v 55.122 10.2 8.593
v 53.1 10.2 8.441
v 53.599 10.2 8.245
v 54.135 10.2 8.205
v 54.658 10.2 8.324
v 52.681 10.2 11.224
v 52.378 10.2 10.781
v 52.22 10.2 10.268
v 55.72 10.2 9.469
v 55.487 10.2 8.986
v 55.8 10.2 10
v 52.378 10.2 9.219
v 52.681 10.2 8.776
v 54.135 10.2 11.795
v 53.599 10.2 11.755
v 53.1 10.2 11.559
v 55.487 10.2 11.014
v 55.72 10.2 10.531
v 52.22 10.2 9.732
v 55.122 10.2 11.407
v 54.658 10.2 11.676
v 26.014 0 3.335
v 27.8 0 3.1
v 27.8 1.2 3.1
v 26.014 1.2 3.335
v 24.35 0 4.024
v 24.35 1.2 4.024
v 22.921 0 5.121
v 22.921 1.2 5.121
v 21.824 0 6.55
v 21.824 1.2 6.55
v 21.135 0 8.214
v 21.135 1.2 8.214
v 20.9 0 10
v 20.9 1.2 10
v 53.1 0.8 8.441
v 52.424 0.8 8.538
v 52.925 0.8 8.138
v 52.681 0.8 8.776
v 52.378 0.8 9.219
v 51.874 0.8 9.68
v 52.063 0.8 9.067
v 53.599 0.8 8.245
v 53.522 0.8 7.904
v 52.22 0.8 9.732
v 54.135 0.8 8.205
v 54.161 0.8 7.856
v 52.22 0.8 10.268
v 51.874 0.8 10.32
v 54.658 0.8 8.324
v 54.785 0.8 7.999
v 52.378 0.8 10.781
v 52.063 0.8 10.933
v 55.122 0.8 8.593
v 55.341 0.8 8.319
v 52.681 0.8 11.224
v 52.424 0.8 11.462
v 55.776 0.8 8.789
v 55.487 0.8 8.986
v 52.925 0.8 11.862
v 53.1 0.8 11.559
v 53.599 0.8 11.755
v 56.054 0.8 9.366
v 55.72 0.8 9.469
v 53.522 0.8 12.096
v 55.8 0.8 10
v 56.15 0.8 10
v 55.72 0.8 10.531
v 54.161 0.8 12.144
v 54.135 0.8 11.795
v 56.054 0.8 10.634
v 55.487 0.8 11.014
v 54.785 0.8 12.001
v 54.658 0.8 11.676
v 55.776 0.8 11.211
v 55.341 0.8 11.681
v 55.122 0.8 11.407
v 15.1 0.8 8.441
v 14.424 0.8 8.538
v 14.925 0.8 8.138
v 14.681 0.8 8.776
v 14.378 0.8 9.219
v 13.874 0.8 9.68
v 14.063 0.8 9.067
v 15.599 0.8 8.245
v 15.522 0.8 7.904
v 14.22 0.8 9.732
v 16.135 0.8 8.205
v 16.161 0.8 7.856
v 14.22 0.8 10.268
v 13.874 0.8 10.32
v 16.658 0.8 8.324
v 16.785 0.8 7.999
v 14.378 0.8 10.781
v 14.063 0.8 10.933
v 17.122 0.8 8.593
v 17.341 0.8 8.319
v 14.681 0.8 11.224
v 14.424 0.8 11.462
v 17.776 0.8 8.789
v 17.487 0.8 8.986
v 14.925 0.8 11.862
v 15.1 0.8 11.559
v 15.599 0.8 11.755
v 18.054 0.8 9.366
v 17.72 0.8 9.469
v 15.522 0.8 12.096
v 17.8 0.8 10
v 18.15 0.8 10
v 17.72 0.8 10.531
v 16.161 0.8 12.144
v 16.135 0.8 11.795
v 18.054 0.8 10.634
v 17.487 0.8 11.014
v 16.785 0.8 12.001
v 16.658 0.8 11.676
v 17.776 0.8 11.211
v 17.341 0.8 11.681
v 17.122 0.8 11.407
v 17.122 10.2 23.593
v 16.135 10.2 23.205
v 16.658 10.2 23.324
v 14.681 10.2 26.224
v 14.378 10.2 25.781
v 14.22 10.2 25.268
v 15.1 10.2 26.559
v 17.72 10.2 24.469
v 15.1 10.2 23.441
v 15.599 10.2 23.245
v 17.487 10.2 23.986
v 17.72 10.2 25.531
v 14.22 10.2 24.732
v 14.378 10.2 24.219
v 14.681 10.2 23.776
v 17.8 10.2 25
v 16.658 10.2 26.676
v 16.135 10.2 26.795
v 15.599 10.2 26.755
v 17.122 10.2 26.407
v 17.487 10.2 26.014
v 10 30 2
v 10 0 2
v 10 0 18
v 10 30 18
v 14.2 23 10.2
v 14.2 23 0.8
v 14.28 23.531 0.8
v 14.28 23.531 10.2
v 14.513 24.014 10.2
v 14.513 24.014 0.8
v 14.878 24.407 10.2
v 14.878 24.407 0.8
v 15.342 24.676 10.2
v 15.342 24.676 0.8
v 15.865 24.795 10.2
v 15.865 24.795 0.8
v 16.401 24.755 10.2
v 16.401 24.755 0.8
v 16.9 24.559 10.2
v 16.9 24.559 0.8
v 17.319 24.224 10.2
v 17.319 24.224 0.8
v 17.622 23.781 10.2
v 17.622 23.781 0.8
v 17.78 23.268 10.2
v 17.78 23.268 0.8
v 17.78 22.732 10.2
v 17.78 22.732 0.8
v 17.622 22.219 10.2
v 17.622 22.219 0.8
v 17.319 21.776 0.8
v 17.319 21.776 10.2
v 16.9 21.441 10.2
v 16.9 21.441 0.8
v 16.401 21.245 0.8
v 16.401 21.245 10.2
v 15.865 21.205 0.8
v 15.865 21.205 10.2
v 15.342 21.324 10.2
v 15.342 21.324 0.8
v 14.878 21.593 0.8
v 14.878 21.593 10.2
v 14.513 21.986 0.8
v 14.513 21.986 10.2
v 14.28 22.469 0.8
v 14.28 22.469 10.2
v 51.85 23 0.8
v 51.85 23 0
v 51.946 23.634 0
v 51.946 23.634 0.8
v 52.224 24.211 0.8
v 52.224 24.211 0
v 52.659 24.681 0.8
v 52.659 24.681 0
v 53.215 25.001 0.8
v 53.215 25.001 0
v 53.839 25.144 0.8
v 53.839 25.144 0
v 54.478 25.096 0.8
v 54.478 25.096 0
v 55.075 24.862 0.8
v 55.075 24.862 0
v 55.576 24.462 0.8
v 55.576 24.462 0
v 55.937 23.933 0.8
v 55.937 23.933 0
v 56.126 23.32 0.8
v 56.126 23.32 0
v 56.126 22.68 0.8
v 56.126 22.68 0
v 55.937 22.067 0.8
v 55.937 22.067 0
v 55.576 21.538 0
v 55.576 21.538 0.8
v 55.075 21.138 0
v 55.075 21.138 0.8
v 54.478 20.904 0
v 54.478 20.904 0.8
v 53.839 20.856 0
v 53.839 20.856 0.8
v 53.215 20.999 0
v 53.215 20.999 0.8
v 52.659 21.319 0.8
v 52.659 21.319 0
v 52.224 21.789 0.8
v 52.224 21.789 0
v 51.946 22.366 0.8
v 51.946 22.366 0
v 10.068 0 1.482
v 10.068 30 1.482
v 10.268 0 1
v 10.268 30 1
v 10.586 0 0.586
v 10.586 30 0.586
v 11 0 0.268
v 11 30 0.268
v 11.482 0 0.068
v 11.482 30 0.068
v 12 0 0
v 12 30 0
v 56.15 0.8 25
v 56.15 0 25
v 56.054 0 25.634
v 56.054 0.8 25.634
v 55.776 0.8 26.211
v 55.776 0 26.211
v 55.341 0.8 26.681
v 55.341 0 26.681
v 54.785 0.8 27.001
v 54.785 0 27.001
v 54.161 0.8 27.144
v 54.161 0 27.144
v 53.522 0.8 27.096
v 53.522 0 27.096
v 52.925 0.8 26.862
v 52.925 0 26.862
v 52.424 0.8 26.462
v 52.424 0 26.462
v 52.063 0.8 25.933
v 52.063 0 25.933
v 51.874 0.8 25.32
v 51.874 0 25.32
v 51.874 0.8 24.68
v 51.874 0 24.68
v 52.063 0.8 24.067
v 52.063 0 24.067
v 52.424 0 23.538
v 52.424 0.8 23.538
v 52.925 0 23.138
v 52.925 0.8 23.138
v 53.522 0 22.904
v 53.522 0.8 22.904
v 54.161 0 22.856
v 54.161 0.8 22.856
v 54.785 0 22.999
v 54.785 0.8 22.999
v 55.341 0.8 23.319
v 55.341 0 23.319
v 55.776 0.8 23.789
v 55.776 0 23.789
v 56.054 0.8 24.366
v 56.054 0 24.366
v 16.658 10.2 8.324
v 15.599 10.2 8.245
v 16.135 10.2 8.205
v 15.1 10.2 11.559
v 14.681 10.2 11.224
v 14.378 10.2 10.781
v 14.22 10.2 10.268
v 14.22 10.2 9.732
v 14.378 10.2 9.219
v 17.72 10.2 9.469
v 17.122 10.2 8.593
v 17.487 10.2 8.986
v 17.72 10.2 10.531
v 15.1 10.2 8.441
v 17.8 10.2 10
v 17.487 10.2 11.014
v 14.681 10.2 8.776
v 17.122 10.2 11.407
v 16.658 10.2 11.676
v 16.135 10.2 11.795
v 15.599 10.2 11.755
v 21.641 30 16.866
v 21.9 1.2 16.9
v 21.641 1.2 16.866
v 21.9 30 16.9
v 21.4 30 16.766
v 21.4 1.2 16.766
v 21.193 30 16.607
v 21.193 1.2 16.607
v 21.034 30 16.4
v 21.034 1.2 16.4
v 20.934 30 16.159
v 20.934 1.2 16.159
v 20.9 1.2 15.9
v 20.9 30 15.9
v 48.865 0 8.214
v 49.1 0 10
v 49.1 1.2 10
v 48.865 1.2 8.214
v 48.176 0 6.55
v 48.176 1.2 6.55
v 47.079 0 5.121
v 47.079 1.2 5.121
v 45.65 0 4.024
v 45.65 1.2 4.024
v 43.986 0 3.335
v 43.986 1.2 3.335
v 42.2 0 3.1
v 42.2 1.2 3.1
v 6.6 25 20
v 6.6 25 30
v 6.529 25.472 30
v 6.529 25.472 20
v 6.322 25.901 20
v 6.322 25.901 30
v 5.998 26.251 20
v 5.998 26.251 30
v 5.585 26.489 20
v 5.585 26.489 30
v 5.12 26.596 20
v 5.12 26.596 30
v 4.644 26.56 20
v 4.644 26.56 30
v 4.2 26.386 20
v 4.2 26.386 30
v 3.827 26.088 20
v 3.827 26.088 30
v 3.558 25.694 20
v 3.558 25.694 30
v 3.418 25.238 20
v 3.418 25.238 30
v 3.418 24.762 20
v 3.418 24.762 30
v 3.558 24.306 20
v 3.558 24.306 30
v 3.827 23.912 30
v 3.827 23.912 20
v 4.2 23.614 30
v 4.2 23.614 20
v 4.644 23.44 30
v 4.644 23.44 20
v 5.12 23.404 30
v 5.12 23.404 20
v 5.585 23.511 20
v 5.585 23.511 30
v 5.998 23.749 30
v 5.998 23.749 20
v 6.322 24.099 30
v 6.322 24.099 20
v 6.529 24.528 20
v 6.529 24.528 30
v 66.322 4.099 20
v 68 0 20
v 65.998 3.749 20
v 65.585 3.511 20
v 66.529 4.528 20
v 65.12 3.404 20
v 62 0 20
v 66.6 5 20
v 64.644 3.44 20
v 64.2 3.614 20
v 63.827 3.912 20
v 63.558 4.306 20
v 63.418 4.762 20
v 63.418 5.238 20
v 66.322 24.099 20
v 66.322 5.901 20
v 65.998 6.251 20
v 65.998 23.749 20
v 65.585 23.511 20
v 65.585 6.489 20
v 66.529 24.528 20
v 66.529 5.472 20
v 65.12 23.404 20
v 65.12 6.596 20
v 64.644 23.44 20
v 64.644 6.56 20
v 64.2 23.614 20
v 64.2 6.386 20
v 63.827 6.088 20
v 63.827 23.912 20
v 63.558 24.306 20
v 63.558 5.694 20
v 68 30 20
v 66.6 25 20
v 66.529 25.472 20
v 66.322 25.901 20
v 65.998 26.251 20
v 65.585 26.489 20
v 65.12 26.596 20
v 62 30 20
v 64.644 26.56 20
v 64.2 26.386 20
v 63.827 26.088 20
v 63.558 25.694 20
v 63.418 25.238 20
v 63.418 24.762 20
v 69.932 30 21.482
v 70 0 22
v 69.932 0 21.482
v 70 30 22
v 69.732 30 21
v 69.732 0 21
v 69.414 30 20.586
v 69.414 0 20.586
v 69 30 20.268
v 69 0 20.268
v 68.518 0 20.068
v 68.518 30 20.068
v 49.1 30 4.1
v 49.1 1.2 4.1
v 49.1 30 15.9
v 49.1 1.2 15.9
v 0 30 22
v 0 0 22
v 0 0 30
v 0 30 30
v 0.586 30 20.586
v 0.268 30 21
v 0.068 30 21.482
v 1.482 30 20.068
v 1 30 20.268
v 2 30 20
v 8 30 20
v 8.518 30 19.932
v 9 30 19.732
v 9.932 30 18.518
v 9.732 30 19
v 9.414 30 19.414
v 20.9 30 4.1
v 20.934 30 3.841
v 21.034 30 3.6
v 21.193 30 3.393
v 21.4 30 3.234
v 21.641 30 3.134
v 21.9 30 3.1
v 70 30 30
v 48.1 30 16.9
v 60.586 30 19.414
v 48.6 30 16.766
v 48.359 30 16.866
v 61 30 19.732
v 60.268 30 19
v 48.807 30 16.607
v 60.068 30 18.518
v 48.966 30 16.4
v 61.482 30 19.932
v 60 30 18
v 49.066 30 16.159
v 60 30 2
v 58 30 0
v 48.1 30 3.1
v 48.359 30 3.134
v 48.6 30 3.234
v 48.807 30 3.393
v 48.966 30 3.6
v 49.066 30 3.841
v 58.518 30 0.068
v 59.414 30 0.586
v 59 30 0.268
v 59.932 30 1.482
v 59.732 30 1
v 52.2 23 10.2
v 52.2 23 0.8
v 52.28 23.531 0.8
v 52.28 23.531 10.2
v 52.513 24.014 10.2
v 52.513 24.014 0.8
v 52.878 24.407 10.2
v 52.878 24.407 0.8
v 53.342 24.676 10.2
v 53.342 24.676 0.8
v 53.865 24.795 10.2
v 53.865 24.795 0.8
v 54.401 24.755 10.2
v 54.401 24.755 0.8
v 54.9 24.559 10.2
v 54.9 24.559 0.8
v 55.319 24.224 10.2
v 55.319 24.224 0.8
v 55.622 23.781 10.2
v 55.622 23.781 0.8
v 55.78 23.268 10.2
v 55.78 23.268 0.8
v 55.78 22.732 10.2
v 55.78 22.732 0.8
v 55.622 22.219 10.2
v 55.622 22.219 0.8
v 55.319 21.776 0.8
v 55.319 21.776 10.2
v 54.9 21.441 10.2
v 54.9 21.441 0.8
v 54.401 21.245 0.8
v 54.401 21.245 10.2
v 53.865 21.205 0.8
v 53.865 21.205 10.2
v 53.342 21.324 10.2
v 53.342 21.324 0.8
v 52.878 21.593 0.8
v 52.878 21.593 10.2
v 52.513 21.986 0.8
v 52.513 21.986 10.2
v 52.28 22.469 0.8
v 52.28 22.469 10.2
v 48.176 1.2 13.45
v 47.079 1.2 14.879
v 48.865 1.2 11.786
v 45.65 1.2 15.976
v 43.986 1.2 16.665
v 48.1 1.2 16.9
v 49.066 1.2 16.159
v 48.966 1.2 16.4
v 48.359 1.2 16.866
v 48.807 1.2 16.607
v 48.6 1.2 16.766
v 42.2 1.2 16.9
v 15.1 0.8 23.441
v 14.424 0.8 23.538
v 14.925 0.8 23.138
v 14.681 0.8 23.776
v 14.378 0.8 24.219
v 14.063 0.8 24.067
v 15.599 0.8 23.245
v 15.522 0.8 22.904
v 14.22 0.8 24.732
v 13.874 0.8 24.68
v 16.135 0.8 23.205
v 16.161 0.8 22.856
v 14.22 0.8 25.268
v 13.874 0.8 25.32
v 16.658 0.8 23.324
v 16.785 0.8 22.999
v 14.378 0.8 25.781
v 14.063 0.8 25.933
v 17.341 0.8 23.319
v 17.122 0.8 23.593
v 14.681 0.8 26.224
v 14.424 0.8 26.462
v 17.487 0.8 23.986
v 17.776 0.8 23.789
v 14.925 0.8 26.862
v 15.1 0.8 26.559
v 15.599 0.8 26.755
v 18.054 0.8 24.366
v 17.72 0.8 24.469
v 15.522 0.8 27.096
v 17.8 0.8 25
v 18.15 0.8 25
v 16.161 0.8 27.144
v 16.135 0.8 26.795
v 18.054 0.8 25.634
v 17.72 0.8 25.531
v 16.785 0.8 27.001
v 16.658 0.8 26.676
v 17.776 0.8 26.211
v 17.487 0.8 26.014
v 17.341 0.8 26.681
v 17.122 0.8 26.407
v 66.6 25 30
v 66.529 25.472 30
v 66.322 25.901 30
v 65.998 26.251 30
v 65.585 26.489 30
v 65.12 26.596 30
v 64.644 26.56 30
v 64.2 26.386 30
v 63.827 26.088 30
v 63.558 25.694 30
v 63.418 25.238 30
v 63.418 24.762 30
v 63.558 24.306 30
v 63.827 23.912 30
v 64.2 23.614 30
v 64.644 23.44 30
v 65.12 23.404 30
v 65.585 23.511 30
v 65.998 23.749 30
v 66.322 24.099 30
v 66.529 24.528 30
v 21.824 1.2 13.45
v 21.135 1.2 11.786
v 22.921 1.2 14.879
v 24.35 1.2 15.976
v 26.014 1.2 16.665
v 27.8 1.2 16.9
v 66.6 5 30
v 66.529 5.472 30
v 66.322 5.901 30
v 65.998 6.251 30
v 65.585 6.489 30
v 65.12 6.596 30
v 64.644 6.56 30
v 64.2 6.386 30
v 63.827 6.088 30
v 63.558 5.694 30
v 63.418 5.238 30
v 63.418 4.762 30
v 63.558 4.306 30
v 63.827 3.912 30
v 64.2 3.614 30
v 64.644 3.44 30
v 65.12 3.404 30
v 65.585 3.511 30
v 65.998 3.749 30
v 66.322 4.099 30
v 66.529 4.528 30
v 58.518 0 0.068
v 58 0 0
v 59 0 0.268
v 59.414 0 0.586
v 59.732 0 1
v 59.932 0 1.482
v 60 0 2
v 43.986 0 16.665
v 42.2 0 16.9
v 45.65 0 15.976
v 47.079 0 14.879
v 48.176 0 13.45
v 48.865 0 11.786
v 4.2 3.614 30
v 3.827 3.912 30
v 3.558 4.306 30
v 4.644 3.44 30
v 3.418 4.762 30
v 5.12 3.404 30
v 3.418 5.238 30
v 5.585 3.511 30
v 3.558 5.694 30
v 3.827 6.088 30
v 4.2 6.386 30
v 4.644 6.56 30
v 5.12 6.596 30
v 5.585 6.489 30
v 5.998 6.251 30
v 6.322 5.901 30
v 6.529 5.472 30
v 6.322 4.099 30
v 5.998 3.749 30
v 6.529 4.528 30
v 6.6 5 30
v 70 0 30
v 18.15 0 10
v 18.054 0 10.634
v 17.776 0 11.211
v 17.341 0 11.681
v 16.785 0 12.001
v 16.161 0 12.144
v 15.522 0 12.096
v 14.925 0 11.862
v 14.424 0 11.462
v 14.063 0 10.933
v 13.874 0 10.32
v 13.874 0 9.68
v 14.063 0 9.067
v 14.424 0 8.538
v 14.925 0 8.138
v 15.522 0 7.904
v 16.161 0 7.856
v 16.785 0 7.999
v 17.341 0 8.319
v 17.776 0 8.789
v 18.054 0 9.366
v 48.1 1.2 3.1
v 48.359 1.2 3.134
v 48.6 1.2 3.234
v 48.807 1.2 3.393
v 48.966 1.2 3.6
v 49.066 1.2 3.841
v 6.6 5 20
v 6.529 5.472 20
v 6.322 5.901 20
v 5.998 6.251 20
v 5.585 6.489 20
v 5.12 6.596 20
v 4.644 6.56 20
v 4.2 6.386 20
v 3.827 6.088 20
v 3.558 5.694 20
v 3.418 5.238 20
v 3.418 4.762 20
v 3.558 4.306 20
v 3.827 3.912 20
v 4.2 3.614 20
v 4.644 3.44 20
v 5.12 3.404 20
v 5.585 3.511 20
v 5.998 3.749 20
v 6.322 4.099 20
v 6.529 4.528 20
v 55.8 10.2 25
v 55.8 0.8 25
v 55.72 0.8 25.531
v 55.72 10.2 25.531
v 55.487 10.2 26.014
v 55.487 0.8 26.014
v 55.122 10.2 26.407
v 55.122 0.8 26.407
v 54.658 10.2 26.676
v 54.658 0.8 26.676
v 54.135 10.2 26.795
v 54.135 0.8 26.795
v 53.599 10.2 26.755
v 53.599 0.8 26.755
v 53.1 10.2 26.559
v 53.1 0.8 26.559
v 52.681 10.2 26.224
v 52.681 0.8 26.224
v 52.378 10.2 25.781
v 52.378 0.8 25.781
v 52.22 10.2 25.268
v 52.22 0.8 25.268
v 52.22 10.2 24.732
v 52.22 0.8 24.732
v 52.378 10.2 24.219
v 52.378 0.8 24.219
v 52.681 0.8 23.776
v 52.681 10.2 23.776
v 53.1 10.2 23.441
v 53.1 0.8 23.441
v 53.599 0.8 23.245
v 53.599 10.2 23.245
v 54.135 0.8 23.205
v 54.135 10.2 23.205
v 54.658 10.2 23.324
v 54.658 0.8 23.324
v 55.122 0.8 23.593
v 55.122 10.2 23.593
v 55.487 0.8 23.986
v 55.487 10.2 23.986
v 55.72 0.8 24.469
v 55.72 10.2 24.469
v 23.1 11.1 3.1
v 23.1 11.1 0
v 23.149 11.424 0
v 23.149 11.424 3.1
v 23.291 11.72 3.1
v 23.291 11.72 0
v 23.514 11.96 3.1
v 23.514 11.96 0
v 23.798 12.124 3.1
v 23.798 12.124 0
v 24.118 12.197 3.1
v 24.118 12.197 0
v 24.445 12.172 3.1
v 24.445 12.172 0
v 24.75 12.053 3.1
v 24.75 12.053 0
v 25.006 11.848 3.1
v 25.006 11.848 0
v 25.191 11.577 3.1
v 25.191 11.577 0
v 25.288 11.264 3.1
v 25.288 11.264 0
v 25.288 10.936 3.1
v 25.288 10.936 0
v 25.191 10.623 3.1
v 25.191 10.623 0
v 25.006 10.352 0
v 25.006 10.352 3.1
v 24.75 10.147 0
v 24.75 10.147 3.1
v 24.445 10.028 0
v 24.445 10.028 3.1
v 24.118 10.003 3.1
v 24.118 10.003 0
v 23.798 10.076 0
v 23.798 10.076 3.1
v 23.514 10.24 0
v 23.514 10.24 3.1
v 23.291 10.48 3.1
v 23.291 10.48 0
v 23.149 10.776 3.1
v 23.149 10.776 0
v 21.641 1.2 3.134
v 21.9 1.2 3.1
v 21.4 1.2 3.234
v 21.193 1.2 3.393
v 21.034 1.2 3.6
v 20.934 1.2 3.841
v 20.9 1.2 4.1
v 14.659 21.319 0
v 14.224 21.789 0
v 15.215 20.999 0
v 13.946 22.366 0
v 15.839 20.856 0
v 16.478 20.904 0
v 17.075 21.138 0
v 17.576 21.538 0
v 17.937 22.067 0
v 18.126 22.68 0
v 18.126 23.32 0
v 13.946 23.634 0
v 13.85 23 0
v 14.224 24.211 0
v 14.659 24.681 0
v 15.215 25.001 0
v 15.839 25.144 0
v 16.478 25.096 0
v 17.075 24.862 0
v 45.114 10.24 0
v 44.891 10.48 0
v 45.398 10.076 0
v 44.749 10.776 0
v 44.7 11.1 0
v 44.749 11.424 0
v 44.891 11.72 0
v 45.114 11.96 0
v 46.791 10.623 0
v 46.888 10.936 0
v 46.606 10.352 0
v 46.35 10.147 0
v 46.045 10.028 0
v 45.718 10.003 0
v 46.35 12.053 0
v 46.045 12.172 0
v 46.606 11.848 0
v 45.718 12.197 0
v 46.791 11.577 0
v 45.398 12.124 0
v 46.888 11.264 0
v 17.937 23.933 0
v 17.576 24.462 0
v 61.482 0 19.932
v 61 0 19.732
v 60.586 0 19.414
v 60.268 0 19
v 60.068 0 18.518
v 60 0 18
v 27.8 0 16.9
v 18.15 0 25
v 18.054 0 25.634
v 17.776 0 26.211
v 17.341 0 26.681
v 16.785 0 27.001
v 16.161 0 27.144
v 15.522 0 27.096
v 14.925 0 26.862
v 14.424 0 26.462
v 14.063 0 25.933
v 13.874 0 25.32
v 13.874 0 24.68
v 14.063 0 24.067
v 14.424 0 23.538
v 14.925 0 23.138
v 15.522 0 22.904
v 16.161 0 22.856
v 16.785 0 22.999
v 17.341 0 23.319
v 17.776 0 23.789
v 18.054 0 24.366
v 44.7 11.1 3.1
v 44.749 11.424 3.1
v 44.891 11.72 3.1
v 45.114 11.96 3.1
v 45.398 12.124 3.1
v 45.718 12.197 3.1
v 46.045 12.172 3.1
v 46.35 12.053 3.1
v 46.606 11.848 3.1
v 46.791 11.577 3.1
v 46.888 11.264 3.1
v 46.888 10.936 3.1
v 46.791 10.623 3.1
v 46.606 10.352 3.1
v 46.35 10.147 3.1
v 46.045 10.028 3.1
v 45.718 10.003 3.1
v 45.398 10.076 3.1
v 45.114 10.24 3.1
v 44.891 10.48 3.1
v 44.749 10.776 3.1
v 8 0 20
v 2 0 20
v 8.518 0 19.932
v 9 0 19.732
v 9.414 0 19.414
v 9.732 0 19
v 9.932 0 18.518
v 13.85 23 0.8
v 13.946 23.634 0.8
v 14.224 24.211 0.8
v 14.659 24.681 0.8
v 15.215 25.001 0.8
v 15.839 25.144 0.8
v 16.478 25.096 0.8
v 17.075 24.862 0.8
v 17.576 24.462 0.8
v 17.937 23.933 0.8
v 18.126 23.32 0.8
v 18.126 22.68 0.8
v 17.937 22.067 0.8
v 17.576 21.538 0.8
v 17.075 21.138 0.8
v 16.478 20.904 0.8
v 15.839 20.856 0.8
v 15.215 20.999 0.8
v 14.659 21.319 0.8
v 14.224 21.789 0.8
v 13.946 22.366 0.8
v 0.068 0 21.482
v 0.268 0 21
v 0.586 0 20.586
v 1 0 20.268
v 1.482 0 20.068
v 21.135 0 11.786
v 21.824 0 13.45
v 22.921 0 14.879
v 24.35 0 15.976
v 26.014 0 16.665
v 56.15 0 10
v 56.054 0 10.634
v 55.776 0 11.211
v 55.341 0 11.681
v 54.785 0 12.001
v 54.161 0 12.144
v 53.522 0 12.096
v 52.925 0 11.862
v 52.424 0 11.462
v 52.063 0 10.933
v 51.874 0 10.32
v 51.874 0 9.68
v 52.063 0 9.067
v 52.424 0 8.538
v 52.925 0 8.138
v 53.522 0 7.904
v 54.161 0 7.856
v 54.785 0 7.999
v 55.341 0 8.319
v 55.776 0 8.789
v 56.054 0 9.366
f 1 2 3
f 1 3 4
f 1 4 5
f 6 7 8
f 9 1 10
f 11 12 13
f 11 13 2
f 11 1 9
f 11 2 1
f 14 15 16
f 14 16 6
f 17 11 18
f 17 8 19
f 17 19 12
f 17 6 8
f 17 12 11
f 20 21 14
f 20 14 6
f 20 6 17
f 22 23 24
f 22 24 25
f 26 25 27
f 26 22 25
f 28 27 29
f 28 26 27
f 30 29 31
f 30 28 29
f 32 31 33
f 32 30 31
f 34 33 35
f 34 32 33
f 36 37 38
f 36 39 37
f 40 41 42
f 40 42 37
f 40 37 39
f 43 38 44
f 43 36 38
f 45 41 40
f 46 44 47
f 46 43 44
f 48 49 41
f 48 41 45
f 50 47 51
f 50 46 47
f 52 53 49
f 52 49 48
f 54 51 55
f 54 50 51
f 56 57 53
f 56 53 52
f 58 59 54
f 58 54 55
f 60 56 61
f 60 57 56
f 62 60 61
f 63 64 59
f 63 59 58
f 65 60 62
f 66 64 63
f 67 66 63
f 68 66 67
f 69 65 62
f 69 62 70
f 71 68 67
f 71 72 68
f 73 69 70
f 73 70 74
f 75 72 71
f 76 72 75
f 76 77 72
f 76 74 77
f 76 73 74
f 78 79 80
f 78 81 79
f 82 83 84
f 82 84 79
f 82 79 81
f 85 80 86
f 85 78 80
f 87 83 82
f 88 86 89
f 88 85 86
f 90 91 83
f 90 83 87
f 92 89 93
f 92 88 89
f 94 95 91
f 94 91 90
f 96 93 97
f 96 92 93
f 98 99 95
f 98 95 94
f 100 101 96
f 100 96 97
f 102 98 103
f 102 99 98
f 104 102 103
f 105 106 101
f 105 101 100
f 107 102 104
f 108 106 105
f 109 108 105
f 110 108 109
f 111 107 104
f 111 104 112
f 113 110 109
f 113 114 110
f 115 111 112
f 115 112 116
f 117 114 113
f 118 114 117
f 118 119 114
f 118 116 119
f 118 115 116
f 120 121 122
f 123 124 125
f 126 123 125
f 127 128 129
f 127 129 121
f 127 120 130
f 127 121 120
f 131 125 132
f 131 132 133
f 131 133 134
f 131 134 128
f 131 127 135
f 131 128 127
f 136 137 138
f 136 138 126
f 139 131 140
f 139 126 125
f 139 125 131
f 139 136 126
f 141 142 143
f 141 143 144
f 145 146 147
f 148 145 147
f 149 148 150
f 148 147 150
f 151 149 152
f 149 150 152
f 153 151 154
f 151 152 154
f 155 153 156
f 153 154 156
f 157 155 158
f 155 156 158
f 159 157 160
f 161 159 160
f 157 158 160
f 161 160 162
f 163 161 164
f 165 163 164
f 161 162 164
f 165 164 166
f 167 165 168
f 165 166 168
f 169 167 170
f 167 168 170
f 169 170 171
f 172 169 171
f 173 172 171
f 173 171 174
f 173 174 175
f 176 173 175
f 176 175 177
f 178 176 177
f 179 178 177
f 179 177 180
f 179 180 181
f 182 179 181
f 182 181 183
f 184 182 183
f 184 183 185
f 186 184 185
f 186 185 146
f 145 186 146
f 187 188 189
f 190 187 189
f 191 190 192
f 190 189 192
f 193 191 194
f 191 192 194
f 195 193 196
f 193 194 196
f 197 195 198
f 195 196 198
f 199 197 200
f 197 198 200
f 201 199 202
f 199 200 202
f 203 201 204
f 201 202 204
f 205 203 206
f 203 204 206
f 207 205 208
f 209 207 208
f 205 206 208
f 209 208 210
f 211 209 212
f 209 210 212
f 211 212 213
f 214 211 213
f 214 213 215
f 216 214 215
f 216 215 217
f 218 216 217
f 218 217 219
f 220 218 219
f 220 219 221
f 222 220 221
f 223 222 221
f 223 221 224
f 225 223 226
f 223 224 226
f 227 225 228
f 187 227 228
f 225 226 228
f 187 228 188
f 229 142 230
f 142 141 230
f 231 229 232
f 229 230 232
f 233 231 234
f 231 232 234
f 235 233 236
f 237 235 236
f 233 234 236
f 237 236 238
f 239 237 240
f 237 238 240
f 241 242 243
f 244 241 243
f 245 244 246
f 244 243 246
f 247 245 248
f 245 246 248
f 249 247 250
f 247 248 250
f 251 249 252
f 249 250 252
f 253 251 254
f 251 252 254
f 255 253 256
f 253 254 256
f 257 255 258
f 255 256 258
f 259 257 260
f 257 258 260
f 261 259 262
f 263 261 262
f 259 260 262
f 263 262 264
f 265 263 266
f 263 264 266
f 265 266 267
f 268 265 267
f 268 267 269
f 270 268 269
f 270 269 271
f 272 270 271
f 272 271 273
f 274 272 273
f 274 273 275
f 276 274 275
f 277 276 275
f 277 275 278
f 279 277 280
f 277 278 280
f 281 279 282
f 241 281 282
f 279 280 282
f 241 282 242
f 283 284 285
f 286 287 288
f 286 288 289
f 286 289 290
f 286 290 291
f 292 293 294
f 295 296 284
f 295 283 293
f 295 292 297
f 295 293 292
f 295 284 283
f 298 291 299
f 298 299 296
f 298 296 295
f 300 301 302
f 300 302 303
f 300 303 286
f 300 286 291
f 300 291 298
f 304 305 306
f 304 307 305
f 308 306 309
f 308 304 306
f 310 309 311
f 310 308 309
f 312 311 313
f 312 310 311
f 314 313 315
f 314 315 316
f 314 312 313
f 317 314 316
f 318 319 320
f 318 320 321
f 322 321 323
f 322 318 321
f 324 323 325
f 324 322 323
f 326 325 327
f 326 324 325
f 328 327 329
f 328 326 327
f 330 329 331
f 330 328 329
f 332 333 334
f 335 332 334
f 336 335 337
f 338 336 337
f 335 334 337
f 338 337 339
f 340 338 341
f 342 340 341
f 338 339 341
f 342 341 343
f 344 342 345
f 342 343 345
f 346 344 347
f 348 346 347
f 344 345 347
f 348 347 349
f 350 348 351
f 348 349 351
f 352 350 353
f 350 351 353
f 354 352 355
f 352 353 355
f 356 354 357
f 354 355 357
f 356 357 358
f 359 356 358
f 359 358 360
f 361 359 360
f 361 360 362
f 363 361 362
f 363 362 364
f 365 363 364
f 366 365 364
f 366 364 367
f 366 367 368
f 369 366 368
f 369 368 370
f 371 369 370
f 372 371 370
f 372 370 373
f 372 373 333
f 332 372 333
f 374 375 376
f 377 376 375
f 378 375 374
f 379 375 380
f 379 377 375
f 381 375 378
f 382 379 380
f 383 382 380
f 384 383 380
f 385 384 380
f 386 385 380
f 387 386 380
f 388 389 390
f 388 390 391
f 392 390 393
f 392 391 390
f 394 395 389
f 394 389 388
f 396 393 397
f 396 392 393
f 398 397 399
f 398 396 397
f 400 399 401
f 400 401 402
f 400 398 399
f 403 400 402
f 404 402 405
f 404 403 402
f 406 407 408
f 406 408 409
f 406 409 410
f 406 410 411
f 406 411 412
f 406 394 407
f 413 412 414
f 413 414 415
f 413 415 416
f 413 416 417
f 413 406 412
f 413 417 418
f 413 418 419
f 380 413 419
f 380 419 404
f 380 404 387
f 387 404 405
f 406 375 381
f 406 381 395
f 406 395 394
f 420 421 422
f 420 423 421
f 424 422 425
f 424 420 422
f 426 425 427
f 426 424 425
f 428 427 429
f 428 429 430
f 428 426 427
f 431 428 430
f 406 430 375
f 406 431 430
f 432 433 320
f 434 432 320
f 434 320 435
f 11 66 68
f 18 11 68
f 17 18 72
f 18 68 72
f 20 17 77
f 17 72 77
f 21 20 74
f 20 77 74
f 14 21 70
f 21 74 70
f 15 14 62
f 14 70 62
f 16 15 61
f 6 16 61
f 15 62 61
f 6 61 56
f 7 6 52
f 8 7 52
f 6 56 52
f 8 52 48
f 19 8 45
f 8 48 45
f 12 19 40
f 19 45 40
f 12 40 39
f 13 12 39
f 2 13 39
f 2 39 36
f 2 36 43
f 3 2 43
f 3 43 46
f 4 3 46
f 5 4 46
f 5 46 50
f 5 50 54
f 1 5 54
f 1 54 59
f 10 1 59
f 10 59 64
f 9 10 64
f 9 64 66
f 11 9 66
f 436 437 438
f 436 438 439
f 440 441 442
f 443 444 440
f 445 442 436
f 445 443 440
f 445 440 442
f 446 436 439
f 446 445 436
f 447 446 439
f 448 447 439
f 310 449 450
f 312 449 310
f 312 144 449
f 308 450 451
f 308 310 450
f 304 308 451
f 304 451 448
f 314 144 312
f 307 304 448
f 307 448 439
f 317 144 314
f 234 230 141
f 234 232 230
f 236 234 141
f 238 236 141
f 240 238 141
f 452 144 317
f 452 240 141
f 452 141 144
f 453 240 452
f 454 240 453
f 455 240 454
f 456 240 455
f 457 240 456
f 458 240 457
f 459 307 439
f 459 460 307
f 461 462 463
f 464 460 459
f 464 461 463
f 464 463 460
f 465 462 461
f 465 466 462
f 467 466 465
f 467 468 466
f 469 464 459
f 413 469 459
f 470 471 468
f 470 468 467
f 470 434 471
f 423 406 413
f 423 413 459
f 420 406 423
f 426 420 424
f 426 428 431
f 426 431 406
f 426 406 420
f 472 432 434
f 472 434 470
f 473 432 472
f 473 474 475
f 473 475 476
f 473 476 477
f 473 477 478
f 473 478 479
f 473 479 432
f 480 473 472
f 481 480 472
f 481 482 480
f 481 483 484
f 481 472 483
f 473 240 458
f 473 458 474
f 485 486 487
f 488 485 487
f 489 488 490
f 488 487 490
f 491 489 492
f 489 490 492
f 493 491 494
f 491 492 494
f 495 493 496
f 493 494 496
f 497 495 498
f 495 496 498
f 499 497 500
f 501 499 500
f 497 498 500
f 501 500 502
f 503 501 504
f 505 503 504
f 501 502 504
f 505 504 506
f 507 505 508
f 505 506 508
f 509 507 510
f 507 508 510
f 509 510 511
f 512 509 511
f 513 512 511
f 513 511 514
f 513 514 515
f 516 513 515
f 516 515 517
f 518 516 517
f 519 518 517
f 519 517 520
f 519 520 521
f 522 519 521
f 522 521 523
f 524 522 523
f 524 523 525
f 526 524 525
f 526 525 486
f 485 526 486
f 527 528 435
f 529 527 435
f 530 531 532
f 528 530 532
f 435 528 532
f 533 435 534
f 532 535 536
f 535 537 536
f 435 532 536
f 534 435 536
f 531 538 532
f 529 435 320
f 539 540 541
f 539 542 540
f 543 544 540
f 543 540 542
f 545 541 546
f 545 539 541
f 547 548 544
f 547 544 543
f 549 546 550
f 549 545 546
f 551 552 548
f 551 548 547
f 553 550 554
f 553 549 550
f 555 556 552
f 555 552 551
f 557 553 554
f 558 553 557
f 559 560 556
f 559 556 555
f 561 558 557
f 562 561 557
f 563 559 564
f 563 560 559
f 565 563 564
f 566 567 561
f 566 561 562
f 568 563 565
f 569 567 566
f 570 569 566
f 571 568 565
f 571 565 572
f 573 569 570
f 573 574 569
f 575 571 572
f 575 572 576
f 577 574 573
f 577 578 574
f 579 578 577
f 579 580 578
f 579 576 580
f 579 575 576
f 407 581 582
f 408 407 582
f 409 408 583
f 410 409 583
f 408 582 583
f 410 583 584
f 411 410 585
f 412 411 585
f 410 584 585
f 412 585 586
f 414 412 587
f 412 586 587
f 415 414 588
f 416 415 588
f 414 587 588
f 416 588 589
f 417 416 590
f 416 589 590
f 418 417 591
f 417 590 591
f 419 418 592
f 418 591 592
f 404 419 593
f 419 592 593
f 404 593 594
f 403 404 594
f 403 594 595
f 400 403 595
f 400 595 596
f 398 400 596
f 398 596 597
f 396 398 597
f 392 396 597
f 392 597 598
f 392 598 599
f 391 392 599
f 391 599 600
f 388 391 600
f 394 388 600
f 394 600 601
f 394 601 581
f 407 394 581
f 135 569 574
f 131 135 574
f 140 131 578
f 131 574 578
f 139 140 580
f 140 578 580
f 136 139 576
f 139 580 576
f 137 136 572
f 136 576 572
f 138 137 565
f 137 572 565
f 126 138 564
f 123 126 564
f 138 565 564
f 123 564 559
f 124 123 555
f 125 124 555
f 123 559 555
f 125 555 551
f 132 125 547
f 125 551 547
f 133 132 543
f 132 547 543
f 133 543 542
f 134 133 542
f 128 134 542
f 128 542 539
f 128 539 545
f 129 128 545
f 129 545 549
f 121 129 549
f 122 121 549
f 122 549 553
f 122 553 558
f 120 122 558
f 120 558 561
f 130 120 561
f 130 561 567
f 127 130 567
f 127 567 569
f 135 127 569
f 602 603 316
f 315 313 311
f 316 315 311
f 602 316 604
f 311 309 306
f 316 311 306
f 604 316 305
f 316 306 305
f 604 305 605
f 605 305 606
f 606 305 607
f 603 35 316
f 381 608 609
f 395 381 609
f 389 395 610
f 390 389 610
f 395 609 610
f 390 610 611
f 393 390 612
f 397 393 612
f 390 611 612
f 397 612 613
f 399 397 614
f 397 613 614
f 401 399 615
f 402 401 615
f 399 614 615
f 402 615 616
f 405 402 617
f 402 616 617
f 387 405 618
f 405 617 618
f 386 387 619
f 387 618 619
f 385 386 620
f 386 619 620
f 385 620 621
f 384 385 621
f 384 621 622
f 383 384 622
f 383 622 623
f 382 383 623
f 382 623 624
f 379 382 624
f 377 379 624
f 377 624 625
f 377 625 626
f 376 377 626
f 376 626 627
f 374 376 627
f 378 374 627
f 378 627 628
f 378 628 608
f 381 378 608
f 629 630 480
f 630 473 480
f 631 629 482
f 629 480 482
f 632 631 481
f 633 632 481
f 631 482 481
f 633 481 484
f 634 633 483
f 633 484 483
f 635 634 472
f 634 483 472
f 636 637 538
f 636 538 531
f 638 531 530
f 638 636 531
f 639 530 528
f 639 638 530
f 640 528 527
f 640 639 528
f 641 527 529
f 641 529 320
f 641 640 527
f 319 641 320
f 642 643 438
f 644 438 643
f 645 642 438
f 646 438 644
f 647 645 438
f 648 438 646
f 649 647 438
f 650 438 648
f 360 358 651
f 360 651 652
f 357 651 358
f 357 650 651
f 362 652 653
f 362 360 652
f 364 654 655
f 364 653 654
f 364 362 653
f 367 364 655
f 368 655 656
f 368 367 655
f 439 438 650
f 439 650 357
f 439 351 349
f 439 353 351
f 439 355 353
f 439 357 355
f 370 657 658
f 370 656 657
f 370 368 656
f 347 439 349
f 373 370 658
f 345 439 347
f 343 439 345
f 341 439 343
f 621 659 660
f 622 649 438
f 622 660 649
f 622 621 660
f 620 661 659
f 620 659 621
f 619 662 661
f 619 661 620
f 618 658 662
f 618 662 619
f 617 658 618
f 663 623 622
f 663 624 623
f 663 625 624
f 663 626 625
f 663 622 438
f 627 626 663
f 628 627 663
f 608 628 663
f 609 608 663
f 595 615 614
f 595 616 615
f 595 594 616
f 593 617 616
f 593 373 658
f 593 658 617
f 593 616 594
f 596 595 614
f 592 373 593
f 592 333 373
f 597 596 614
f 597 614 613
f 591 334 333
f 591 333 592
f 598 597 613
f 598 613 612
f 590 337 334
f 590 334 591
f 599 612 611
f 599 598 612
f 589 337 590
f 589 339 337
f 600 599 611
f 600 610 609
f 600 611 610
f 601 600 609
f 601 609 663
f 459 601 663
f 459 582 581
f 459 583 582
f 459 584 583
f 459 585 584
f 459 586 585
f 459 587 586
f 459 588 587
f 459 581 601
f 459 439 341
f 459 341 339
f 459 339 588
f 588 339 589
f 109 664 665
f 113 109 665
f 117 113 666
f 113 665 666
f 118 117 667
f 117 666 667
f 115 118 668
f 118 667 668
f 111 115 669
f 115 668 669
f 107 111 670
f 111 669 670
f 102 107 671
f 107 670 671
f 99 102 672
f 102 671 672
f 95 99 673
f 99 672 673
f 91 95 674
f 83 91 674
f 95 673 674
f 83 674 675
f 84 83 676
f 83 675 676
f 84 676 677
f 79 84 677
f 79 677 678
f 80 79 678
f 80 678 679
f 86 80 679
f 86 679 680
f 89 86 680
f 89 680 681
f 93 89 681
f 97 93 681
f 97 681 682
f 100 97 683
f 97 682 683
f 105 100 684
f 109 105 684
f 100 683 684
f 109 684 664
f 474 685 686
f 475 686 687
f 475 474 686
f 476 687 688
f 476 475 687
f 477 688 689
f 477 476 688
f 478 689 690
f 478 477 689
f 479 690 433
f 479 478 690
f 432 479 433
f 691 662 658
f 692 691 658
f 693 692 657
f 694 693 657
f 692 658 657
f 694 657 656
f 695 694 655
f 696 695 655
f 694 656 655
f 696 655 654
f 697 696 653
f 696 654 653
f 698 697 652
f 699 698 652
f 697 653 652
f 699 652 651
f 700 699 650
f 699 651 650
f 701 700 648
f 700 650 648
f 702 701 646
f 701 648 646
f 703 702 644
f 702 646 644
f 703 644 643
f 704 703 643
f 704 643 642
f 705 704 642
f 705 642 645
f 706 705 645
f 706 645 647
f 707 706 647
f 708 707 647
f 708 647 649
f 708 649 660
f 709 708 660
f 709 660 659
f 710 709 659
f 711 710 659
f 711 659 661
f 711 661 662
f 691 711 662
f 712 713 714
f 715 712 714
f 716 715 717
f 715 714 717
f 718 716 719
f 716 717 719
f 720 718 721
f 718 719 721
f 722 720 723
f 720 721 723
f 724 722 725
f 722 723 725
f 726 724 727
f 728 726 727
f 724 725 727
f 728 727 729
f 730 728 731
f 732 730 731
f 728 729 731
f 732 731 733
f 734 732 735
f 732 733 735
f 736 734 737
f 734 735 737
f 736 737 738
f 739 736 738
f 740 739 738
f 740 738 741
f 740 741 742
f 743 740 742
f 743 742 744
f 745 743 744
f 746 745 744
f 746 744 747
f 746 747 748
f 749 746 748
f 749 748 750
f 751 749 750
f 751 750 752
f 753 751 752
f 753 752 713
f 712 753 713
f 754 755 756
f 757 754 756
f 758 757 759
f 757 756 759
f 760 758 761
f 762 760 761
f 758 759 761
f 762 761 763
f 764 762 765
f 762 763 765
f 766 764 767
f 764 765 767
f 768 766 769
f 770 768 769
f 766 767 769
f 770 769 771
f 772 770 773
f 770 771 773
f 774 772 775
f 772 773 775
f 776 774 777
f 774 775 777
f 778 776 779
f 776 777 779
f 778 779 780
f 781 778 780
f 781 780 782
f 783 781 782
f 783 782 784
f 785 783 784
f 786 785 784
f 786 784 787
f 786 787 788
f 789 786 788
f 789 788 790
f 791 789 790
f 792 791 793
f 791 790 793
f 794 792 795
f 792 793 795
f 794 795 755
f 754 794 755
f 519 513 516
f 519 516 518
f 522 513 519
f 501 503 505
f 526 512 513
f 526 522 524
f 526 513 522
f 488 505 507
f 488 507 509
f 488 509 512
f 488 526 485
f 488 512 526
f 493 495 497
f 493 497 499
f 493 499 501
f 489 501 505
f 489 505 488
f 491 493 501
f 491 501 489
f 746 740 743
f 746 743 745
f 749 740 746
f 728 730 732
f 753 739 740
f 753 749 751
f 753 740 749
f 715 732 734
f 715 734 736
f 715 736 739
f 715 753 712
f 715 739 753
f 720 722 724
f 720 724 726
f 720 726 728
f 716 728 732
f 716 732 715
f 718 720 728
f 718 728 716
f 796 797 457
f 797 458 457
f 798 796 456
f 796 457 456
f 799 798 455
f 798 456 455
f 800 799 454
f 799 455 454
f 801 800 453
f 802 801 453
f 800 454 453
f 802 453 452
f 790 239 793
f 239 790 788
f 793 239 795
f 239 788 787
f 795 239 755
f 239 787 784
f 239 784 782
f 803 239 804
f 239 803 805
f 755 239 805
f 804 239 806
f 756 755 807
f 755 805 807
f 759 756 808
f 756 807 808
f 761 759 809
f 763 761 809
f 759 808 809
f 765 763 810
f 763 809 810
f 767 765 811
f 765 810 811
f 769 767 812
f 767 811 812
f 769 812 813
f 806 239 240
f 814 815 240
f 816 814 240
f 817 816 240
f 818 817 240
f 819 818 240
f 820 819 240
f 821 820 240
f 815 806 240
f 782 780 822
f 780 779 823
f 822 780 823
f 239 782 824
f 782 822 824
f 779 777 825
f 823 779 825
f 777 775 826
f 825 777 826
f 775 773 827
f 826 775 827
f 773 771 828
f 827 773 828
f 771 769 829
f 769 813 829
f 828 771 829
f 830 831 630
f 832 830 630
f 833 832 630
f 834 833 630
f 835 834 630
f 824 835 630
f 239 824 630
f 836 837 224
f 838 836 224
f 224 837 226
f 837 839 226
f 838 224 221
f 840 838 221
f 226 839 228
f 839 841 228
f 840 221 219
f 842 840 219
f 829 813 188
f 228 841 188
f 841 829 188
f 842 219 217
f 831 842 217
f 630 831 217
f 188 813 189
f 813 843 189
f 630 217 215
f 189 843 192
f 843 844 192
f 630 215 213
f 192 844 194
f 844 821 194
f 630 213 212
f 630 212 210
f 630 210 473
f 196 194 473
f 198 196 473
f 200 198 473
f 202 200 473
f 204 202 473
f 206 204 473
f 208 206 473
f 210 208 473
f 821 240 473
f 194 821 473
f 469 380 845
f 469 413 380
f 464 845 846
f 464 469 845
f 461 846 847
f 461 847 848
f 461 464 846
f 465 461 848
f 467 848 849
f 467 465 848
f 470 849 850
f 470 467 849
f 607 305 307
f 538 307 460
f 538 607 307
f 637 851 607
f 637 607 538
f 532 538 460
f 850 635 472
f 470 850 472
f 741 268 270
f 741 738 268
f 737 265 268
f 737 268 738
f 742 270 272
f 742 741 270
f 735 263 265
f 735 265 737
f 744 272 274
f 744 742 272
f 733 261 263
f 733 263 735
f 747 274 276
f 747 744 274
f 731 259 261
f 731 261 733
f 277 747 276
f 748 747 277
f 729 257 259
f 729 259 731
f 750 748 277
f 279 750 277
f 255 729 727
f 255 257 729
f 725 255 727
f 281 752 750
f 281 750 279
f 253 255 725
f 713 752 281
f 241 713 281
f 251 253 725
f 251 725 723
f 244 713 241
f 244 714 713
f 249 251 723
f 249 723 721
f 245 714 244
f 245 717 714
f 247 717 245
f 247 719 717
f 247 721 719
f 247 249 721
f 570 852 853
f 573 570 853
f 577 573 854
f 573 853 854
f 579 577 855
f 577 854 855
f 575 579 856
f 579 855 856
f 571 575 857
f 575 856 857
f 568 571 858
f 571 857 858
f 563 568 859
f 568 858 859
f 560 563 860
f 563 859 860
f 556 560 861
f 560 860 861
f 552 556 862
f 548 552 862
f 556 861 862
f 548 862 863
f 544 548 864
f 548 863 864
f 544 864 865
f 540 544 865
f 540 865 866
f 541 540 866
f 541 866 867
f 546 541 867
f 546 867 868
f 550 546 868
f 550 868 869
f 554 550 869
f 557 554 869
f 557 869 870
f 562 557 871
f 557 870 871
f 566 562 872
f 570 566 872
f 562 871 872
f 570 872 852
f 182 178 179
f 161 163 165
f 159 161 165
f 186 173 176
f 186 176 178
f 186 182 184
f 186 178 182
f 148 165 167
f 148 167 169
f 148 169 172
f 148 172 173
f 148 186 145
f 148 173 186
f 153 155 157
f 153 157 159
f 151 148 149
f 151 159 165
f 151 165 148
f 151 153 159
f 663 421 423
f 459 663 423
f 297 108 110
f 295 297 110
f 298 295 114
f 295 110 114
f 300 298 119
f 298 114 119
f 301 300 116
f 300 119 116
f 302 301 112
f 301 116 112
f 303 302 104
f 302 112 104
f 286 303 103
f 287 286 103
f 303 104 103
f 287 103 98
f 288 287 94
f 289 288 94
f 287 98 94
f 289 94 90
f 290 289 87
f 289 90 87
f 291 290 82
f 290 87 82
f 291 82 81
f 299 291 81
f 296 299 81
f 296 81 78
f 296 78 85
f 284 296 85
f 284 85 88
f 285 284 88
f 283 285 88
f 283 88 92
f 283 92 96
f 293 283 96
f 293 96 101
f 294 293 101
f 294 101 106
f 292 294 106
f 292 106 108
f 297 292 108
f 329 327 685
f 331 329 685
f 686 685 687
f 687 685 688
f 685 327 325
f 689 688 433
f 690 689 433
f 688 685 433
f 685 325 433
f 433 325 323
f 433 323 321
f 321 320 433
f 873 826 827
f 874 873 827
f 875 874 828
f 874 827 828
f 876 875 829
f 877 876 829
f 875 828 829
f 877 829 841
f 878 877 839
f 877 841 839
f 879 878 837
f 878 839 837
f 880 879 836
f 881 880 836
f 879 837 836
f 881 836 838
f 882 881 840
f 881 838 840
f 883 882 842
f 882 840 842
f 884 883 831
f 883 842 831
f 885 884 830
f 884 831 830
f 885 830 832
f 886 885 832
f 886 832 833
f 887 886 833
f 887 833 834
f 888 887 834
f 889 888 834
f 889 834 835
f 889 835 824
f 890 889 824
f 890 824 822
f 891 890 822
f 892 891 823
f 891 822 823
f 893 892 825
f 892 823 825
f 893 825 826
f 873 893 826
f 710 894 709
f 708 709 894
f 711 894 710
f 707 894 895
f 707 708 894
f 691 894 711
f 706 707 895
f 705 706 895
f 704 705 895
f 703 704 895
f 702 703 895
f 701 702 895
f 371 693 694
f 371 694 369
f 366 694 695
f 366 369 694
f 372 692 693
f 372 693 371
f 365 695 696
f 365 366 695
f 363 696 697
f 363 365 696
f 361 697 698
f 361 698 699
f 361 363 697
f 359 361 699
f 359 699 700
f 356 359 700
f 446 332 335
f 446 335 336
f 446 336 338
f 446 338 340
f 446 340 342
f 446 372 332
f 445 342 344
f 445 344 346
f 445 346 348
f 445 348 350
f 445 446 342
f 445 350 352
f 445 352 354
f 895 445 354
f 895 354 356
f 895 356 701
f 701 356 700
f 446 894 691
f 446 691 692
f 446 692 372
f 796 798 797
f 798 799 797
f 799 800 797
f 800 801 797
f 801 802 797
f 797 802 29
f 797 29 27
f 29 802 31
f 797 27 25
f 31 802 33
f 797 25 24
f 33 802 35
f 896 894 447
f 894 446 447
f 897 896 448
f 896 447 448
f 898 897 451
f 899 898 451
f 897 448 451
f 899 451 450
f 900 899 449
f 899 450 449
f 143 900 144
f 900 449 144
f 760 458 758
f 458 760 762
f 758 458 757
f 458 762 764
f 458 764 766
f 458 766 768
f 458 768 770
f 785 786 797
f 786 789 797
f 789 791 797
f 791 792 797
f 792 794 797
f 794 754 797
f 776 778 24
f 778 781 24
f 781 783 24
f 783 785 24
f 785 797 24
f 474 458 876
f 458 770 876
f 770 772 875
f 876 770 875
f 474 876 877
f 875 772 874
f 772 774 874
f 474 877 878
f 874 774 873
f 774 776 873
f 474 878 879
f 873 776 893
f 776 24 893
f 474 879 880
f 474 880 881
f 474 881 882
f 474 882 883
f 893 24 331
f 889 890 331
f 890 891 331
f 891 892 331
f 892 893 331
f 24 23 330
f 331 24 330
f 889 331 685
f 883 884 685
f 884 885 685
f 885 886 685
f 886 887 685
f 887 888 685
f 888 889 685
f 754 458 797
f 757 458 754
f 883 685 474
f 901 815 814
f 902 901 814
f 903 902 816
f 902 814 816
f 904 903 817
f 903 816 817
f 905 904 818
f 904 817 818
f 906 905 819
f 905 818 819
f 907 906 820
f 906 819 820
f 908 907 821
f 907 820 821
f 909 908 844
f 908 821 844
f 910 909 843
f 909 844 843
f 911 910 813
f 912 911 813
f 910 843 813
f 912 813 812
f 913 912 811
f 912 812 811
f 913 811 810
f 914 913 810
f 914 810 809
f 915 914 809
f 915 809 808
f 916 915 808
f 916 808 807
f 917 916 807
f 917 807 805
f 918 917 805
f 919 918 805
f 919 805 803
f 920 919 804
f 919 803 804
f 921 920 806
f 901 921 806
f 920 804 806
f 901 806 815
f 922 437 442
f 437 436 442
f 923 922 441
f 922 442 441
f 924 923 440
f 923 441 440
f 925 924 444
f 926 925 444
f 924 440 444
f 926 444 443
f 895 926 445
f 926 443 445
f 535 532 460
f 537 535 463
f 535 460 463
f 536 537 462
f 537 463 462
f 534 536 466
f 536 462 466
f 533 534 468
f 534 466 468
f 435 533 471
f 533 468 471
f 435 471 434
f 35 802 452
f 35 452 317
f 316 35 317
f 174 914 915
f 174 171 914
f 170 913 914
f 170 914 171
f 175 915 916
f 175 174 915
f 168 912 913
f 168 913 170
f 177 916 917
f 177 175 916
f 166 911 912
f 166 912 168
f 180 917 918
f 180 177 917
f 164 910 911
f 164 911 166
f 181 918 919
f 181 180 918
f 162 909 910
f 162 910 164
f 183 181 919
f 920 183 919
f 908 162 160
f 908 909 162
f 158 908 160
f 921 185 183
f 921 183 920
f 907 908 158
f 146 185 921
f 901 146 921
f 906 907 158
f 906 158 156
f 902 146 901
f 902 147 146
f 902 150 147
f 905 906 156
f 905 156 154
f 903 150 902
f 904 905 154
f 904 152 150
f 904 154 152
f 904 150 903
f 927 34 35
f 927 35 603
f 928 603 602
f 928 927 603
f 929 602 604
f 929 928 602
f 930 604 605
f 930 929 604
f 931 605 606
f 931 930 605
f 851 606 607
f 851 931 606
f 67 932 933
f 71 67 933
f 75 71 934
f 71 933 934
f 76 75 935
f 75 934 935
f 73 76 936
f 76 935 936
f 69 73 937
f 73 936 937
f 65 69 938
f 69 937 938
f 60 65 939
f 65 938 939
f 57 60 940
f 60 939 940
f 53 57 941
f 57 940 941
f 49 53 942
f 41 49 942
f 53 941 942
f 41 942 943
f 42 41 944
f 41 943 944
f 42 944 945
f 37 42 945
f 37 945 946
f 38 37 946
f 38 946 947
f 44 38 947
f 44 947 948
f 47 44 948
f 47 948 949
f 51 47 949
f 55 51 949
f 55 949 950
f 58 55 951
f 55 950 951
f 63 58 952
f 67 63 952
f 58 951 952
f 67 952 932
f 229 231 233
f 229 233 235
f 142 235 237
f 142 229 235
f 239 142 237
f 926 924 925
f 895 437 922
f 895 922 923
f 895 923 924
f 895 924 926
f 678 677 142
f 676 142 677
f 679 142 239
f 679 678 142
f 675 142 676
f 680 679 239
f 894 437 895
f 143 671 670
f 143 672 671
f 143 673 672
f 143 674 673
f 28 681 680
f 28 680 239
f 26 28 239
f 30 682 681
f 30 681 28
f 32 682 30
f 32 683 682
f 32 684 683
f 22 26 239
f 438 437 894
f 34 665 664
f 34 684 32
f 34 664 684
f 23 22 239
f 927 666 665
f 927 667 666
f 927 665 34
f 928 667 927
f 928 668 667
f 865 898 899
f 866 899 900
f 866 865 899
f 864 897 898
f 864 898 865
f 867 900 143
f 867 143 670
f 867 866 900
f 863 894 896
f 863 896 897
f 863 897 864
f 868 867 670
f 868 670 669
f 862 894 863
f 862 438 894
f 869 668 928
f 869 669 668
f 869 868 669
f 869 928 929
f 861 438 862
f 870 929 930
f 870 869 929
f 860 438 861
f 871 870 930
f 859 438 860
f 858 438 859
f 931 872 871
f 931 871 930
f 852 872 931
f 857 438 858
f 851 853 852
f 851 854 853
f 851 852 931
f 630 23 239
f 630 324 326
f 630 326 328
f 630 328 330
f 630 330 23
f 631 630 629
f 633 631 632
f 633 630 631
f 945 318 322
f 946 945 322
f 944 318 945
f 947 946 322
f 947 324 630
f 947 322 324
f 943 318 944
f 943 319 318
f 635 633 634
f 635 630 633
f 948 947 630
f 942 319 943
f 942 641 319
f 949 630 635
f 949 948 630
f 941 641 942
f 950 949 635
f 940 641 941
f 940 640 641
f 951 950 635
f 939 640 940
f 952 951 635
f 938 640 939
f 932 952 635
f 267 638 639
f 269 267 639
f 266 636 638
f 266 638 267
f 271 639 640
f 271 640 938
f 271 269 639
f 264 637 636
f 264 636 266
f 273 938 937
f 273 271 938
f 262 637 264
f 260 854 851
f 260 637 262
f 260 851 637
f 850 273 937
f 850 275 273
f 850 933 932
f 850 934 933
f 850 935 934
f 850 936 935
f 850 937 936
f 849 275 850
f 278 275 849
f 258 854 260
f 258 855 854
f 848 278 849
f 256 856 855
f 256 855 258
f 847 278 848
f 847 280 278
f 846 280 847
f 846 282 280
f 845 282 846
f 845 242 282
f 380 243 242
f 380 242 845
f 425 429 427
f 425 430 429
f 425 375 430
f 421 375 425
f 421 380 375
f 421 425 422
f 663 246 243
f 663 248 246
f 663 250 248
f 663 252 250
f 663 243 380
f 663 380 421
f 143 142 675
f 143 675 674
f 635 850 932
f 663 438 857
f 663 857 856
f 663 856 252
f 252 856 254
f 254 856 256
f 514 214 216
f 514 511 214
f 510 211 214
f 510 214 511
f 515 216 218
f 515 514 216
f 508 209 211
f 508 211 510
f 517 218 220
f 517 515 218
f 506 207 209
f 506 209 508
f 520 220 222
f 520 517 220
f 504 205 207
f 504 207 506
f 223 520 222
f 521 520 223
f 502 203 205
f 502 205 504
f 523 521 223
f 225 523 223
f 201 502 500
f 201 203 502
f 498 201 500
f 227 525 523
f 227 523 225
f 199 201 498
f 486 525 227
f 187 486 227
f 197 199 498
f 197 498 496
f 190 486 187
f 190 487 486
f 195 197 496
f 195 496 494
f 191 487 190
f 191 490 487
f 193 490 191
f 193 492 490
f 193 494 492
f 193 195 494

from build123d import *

# Parameters (mm, degrees)
SKETCH_1_W          = 70
SKETCH_1_H          = 30
EXTRUDE_1_DEPTH     = 30
SKETCH_2_R          = 1.6
CUT_EXTRUDE_1_DEPTH = 31
SKETCH_3_W          = 28.2
SKETCH_3_H          = 13.8
CUT_EXTRUDE_2_DEPTH = 31
EXTRUDE_2_DEPTH     = 1.2
SKETCH_5_R          = 1.1
CUT_EXTRUDE_3_DEPTH = 3.1
SKETCH_6_W          = 10
SKETCH_6_H          = 30
CUT_EXTRUDE_4_DEPTH = 20
SKETCH_7_R          = 1.8
CUT_EXTRUDE_5_DEPTH = 10.2
SKETCH_8_R          = 2.15
CUT_EXTRUDE_6_DEPTH = 0.8
SKETCH_9_R          = 1.8
CUT_EXTRUDE_7_DEPTH = 10.2
SKETCH_10_R         = 2.15
CUT_EXTRUDE_8_DEPTH = 0.8
FILLET_1_R          = 2
FILLET_2_R          = 1


with BuildPart() as part:
    # 草图1 → 凸台-拉伸1 (new body)
    with BuildSketch(Plane.XY):
        with Locations((35, 15)):
            Rectangle(SKETCH_1_W, SKETCH_1_H)
    extrude(amount=EXTRUDE_1_DEPTH)

    # 草图2 → 切除-拉伸1 (cut, through all)
    with BuildSketch(Plane.XY.offset(30)):
        with Locations((5, 5)):
            Circle(SKETCH_2_R)
        with Locations((65, 5)):
            Circle(SKETCH_2_R)
        with Locations((65, 25)):
            Circle(SKETCH_2_R)
        with Locations((5, 25)):
            Circle(SKETCH_2_R)
    extrude(amount=-CUT_EXTRUDE_1_DEPTH, mode=Mode.SUBTRACT)

    # 草图3 → 切除-拉伸2 (cut, through all)
    with BuildSketch(Plane.XZ):
        with Locations((35, 10)):
            Rectangle(SKETCH_3_W, SKETCH_3_H)
    extrude(amount=-CUT_EXTRUDE_2_DEPTH, mode=Mode.SUBTRACT)

    # 草图4 → 凸台-拉伸2 (add)
    with BuildSketch(Plane.XZ):
        with BuildLine():
            ThreePointArc((20.9, 10), (22.92096321, 14.87903679), (27.8, 16.9))
            Line((27.8, 16.9), (20.9, 16.9))
            Line((20.9, 16.9), (20.9, 10))
        make_face()
        with BuildLine():
            ThreePointArc((27.8, 3.1), (22.92096321, 5.12096321), (20.9, 10))
            Line((20.9, 10), (20.9, 3.1))
            Line((20.9, 3.1), (27.8, 3.1))
        make_face()
        with BuildLine():
            Line((49.1, 16.9), (42.2, 16.9))
            ThreePointArc((42.2, 16.9), (47.079036757, 14.879036823), (49.1, 10.000000094))
            Line((49.1, 10.000000094), (49.1, 16.9))
        make_face()
        with BuildLine():
            Line((49.1, 3.1), (49.1, 10.000000094))
            ThreePointArc((49.1, 10.000000094), (47.079036823, 5.120963243), (42.2, 3.1))
            Line((42.2, 3.1), (49.1, 3.1))
        make_face()
    extrude(amount=-EXTRUDE_2_DEPTH)

    # 草图5 → 切除-拉伸3 (cut)
    with BuildSketch(Plane(origin=(0, 0, 0), x_dir=(-1, 0, 0), z_dir=(0, 0, -1))):
        with Locations((-45.8, 11.1)):
            Circle(SKETCH_5_R)
        with Locations((-24.2, 11.1)):
            Circle(SKETCH_5_R)
    extrude(amount=-CUT_EXTRUDE_3_DEPTH, mode=Mode.SUBTRACT)

    # 草图6 → 切除-拉伸4 (cut)
    with BuildSketch(Plane(origin=(0, 0, 0), x_dir=(-1, 0, 0), z_dir=(0, 0, -1))):
        with Locations((-65, 15)):
            Rectangle(SKETCH_6_W, SKETCH_6_H)
        with Locations((-5, 15)):
            Rectangle(SKETCH_6_W, SKETCH_6_H)
    extrude(amount=-CUT_EXTRUDE_4_DEPTH, mode=Mode.SUBTRACT)

    # 草图7 → 切除-拉伸5 (cut)
    with BuildSketch(Plane.XZ):
        with Locations((54, 10)):
            Circle(SKETCH_7_R)
        with Locations((16, 10)):
            Circle(SKETCH_7_R)
        with Locations((54, 25)):
            Circle(SKETCH_7_R)
        with Locations((16, 25)):
            Circle(SKETCH_7_R)
    extrude(amount=-CUT_EXTRUDE_5_DEPTH, mode=Mode.SUBTRACT)

    # 草图8 → 切除-拉伸6 (cut)
    with BuildSketch(Plane.XZ):
        with Locations((54, 10)):
            Circle(SKETCH_8_R)
        with Locations((16, 10)):
            Circle(SKETCH_8_R)
        with Locations((54, 25)):
            Circle(SKETCH_8_R)
        with Locations((16, 25)):
            Circle(SKETCH_8_R)
    extrude(amount=-CUT_EXTRUDE_6_DEPTH, mode=Mode.SUBTRACT)

    # 草图9 → 切除-拉伸7 (cut)
    with BuildSketch(Plane(origin=(0, 0, 0), x_dir=(-1, 0, 0), z_dir=(0, 0, -1))):
        with Locations((-54, 23)):
            Circle(SKETCH_9_R)
        with Locations((-16, 23)):
            Circle(SKETCH_9_R)
    extrude(amount=-CUT_EXTRUDE_7_DEPTH, mode=Mode.SUBTRACT)

    # 草图10 → 切除-拉伸8 (cut)
    with BuildSketch(Plane(origin=(0, 0, 0), x_dir=(-1, 0, 0), z_dir=(0, 0, -1))):
        with Locations((-54, 23)):
            Circle(SKETCH_10_R)
        with Locations((-16, 23)):
            Circle(SKETCH_10_R)
    extrude(amount=-CUT_EXTRUDE_8_DEPTH, mode=Mode.SUBTRACT)

    # 圆角1
    fillet_1_edges = [part.edges().sort_by_distance(p)[0] for p in [
        (60, 15, 0),
        (70, 15, 20),
        (60, 15, 20),
        (10, 15, 0),
        (10, 15, 20),
        (0, 15, 20),
    ]]
    fillet(fillet_1_edges, radius=FILLET_1_R)

    # 圆角2
    fillet_2_edges = [part.edges().sort_by_distance(p)[0] for p in [
        (20.9, 15.6, 3.1),
        (20.9, 15.6, 16.9),
        (49.1, 15.6, 16.9),
        (49.1, 15.6, 3.1),
    ]]
    fillet(fillet_2_edges, radius=FILLET_2_R)


solid = part.part
